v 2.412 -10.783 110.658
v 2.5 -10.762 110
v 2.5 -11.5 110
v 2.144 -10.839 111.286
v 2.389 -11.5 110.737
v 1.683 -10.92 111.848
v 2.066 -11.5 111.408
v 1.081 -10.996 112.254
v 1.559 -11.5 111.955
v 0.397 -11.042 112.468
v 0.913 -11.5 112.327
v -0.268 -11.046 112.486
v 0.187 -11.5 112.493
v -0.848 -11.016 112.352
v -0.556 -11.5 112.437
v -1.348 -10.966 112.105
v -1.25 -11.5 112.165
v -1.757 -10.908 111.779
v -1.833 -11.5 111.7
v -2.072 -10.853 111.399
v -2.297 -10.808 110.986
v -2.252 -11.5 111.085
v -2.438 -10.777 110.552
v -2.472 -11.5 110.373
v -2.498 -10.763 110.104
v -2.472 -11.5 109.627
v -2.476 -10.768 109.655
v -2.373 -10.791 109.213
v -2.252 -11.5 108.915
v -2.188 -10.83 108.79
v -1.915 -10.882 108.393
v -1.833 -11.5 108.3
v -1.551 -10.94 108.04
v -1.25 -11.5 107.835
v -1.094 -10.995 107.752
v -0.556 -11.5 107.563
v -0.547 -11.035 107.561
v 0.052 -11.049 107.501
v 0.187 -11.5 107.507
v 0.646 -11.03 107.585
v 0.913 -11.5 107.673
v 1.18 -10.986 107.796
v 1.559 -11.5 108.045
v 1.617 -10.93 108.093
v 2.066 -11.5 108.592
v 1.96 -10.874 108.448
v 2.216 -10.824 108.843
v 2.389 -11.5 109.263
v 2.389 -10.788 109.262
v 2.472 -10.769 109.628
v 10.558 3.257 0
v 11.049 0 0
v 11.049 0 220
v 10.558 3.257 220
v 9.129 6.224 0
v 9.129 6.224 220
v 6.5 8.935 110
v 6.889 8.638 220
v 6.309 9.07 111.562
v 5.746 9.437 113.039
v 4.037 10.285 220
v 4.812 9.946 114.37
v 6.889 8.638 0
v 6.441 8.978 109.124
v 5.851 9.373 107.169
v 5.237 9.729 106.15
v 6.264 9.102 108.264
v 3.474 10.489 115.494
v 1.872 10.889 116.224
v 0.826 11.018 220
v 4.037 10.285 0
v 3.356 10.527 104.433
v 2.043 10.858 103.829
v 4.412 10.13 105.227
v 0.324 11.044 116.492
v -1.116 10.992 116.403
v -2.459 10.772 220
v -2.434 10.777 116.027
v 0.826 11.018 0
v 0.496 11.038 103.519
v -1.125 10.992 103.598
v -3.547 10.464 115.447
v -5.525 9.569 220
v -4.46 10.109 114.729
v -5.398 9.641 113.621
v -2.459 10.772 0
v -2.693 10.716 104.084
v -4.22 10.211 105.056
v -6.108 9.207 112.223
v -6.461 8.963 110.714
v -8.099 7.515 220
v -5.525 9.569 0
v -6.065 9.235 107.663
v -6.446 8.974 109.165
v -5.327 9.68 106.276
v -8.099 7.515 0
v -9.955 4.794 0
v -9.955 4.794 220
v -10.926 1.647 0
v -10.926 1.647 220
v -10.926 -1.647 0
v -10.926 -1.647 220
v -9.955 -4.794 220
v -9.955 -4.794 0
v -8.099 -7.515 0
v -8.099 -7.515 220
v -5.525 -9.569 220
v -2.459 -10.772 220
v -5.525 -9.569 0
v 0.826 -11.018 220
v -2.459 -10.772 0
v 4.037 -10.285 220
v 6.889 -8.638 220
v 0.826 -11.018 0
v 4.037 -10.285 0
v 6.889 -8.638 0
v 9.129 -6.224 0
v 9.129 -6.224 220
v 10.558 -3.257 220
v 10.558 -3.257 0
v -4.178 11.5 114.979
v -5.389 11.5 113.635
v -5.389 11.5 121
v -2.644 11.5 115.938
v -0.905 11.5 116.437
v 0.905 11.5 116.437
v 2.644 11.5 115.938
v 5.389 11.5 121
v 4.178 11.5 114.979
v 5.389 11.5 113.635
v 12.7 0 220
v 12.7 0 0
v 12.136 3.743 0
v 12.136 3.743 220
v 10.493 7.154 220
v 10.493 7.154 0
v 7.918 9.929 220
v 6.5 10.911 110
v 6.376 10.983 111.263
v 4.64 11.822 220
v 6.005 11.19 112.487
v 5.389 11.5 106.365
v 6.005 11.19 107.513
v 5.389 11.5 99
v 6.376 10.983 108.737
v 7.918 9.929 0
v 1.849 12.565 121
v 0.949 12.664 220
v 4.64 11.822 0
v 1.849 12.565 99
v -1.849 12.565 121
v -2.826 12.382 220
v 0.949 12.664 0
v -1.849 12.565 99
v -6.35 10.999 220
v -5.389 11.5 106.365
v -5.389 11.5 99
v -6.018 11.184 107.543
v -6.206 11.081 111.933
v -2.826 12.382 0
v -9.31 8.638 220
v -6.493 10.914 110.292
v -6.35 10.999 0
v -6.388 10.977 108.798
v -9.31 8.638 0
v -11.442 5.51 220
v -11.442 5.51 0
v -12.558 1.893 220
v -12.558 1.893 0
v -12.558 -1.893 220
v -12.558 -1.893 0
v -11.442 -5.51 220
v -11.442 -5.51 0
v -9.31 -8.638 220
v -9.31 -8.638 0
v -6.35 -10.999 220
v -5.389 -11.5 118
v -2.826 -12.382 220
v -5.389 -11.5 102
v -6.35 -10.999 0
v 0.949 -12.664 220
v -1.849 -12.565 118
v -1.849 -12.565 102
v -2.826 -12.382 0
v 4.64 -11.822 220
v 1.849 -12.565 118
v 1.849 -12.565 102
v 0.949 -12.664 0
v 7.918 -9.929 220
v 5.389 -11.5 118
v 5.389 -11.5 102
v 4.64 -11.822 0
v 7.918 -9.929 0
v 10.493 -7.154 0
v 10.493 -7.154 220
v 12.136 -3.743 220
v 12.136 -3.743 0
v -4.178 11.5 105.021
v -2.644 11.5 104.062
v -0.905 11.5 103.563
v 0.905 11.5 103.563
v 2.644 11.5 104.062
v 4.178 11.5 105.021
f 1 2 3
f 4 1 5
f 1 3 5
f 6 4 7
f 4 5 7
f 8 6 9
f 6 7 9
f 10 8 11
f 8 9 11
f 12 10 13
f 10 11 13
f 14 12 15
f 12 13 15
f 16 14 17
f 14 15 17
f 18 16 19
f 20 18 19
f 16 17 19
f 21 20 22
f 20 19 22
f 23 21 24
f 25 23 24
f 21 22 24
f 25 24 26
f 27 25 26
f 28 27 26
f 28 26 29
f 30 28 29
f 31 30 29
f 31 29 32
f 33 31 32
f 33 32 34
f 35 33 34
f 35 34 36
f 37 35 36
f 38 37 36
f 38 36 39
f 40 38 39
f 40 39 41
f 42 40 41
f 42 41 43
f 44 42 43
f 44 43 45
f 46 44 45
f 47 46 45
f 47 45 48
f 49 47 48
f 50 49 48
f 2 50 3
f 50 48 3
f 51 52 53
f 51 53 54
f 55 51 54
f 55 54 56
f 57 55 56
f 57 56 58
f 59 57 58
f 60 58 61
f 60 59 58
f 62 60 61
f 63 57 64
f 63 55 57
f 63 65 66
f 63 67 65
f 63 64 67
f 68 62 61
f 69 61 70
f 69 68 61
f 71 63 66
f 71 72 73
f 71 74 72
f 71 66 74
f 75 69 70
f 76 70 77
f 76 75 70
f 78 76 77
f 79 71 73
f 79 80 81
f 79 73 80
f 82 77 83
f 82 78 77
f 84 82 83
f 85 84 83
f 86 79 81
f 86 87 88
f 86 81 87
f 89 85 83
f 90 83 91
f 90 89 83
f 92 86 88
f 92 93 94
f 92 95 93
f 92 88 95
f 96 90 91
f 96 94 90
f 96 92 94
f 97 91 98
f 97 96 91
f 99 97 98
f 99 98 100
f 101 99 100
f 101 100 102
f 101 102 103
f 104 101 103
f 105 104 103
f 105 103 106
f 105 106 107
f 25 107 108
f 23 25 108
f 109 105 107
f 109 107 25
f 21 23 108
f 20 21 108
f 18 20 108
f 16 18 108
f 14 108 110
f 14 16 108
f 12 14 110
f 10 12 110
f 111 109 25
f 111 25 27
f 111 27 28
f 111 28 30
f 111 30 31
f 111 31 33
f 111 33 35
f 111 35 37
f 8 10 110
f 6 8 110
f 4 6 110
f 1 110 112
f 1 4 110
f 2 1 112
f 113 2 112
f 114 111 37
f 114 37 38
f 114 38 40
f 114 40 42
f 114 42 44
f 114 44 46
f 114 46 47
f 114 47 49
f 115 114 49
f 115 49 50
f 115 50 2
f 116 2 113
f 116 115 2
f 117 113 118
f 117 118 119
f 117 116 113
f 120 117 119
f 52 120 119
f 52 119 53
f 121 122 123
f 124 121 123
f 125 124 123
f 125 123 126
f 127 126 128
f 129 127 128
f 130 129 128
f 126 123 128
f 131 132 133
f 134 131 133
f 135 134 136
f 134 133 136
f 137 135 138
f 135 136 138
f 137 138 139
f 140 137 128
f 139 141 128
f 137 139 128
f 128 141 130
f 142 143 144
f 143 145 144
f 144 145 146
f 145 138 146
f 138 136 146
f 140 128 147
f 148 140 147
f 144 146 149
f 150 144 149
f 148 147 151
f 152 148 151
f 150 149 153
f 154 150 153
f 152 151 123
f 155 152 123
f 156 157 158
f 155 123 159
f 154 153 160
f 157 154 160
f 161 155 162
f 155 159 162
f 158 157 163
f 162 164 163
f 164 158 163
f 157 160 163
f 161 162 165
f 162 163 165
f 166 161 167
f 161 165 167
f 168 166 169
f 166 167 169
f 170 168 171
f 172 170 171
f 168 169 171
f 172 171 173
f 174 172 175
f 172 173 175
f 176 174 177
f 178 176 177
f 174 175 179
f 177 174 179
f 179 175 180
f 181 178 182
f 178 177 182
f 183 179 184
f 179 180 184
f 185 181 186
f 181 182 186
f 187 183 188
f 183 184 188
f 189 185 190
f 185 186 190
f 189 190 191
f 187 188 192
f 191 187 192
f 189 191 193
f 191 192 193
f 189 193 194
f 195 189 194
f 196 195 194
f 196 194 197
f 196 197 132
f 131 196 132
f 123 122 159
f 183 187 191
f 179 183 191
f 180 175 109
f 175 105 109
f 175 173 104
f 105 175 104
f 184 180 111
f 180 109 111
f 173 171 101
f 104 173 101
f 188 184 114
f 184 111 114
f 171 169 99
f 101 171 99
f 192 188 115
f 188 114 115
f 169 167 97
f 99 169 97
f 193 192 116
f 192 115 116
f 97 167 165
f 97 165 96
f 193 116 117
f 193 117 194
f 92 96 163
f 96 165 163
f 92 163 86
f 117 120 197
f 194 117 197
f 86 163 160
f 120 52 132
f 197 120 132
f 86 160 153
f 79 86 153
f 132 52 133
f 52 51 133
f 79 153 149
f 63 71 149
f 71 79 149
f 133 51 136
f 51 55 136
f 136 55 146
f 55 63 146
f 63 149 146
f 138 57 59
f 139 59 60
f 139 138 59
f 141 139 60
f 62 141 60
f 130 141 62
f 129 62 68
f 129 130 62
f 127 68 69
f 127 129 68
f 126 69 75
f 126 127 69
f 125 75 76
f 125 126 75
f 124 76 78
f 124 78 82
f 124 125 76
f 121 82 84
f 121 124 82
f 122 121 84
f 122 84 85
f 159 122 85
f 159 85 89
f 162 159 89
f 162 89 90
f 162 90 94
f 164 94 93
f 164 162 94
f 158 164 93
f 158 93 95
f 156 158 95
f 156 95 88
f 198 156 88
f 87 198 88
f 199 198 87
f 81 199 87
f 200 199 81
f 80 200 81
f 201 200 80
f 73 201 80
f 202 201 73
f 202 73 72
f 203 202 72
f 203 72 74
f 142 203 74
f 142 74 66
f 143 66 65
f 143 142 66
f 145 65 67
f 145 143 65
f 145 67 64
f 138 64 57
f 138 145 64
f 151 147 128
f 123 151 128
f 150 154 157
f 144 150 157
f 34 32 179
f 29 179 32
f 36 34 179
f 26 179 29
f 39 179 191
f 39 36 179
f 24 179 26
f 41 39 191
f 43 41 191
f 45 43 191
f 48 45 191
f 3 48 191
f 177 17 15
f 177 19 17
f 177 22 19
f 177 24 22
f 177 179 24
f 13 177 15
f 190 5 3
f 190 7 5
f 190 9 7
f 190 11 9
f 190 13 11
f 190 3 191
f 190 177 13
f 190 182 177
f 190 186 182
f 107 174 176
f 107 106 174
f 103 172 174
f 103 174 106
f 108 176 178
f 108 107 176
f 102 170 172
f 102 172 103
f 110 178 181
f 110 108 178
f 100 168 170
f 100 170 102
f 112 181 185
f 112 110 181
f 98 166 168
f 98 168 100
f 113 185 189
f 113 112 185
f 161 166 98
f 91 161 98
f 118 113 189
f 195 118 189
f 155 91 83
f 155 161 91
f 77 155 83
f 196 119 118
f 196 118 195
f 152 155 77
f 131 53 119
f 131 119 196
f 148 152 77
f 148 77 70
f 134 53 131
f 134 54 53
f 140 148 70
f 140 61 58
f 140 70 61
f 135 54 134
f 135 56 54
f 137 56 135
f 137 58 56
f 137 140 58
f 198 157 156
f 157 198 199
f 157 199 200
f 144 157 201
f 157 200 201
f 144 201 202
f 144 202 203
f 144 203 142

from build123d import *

# Parameters (mm, degrees)
F0_R      = 12.7
F0_R_2    = 11.049
F1_DEPTH  = 220
F5_R      = 6.5
F6_DEPTH  = 15
F7_W      = 37.640377
F7_H      = 22
F8_DEPTH  = 1.2
F9_R      = 2.5
F10_DEPTH = 15
F11_W     = 50.336801
F11_H     = 16
F12_DEPTH = 1.2


with BuildPart() as f1:
    # F0 (on Top) → F1 (new body)
    with BuildSketch(Plane.XY):
        Circle(F0_R)
        Circle(F0_R_2, mode=Mode.SUBTRACT)
    extrude(amount=F1_DEPTH)

    # F5 (on offset) → F6 (cut)
    with BuildSketch(Plane.XZ.offset(-12.7)):
        with Locations((0, 110)):
            Circle(F5_R)
    extrude(amount=F6_DEPTH, mode=Mode.SUBTRACT)

    # F7 (on offset) → F8 (cut)
    with BuildSketch(Plane.XZ.offset(-12.7)):
        with Locations((-0.882831, 110)):
            Rectangle(F7_W, F7_H)
    extrude(amount=F8_DEPTH, mode=Mode.SUBTRACT)

    # F9 (on offset) → F10 (cut)
    with BuildSketch(Plane.XZ.offset(12.7)):
        with Locations((0, 110)):
            Circle(F9_R)
    extrude(amount=-F10_DEPTH, mode=Mode.SUBTRACT)

    # F11 (on offset) → F12 (cut)
    with BuildSketch(Plane.XZ.offset(12.7)):
        with Locations((-0.771954, 110)):
            Rectangle(F11_W, F11_H)
    extrude(amount=-F12_DEPTH, mode=Mode.SUBTRACT)


solid = f1.part
